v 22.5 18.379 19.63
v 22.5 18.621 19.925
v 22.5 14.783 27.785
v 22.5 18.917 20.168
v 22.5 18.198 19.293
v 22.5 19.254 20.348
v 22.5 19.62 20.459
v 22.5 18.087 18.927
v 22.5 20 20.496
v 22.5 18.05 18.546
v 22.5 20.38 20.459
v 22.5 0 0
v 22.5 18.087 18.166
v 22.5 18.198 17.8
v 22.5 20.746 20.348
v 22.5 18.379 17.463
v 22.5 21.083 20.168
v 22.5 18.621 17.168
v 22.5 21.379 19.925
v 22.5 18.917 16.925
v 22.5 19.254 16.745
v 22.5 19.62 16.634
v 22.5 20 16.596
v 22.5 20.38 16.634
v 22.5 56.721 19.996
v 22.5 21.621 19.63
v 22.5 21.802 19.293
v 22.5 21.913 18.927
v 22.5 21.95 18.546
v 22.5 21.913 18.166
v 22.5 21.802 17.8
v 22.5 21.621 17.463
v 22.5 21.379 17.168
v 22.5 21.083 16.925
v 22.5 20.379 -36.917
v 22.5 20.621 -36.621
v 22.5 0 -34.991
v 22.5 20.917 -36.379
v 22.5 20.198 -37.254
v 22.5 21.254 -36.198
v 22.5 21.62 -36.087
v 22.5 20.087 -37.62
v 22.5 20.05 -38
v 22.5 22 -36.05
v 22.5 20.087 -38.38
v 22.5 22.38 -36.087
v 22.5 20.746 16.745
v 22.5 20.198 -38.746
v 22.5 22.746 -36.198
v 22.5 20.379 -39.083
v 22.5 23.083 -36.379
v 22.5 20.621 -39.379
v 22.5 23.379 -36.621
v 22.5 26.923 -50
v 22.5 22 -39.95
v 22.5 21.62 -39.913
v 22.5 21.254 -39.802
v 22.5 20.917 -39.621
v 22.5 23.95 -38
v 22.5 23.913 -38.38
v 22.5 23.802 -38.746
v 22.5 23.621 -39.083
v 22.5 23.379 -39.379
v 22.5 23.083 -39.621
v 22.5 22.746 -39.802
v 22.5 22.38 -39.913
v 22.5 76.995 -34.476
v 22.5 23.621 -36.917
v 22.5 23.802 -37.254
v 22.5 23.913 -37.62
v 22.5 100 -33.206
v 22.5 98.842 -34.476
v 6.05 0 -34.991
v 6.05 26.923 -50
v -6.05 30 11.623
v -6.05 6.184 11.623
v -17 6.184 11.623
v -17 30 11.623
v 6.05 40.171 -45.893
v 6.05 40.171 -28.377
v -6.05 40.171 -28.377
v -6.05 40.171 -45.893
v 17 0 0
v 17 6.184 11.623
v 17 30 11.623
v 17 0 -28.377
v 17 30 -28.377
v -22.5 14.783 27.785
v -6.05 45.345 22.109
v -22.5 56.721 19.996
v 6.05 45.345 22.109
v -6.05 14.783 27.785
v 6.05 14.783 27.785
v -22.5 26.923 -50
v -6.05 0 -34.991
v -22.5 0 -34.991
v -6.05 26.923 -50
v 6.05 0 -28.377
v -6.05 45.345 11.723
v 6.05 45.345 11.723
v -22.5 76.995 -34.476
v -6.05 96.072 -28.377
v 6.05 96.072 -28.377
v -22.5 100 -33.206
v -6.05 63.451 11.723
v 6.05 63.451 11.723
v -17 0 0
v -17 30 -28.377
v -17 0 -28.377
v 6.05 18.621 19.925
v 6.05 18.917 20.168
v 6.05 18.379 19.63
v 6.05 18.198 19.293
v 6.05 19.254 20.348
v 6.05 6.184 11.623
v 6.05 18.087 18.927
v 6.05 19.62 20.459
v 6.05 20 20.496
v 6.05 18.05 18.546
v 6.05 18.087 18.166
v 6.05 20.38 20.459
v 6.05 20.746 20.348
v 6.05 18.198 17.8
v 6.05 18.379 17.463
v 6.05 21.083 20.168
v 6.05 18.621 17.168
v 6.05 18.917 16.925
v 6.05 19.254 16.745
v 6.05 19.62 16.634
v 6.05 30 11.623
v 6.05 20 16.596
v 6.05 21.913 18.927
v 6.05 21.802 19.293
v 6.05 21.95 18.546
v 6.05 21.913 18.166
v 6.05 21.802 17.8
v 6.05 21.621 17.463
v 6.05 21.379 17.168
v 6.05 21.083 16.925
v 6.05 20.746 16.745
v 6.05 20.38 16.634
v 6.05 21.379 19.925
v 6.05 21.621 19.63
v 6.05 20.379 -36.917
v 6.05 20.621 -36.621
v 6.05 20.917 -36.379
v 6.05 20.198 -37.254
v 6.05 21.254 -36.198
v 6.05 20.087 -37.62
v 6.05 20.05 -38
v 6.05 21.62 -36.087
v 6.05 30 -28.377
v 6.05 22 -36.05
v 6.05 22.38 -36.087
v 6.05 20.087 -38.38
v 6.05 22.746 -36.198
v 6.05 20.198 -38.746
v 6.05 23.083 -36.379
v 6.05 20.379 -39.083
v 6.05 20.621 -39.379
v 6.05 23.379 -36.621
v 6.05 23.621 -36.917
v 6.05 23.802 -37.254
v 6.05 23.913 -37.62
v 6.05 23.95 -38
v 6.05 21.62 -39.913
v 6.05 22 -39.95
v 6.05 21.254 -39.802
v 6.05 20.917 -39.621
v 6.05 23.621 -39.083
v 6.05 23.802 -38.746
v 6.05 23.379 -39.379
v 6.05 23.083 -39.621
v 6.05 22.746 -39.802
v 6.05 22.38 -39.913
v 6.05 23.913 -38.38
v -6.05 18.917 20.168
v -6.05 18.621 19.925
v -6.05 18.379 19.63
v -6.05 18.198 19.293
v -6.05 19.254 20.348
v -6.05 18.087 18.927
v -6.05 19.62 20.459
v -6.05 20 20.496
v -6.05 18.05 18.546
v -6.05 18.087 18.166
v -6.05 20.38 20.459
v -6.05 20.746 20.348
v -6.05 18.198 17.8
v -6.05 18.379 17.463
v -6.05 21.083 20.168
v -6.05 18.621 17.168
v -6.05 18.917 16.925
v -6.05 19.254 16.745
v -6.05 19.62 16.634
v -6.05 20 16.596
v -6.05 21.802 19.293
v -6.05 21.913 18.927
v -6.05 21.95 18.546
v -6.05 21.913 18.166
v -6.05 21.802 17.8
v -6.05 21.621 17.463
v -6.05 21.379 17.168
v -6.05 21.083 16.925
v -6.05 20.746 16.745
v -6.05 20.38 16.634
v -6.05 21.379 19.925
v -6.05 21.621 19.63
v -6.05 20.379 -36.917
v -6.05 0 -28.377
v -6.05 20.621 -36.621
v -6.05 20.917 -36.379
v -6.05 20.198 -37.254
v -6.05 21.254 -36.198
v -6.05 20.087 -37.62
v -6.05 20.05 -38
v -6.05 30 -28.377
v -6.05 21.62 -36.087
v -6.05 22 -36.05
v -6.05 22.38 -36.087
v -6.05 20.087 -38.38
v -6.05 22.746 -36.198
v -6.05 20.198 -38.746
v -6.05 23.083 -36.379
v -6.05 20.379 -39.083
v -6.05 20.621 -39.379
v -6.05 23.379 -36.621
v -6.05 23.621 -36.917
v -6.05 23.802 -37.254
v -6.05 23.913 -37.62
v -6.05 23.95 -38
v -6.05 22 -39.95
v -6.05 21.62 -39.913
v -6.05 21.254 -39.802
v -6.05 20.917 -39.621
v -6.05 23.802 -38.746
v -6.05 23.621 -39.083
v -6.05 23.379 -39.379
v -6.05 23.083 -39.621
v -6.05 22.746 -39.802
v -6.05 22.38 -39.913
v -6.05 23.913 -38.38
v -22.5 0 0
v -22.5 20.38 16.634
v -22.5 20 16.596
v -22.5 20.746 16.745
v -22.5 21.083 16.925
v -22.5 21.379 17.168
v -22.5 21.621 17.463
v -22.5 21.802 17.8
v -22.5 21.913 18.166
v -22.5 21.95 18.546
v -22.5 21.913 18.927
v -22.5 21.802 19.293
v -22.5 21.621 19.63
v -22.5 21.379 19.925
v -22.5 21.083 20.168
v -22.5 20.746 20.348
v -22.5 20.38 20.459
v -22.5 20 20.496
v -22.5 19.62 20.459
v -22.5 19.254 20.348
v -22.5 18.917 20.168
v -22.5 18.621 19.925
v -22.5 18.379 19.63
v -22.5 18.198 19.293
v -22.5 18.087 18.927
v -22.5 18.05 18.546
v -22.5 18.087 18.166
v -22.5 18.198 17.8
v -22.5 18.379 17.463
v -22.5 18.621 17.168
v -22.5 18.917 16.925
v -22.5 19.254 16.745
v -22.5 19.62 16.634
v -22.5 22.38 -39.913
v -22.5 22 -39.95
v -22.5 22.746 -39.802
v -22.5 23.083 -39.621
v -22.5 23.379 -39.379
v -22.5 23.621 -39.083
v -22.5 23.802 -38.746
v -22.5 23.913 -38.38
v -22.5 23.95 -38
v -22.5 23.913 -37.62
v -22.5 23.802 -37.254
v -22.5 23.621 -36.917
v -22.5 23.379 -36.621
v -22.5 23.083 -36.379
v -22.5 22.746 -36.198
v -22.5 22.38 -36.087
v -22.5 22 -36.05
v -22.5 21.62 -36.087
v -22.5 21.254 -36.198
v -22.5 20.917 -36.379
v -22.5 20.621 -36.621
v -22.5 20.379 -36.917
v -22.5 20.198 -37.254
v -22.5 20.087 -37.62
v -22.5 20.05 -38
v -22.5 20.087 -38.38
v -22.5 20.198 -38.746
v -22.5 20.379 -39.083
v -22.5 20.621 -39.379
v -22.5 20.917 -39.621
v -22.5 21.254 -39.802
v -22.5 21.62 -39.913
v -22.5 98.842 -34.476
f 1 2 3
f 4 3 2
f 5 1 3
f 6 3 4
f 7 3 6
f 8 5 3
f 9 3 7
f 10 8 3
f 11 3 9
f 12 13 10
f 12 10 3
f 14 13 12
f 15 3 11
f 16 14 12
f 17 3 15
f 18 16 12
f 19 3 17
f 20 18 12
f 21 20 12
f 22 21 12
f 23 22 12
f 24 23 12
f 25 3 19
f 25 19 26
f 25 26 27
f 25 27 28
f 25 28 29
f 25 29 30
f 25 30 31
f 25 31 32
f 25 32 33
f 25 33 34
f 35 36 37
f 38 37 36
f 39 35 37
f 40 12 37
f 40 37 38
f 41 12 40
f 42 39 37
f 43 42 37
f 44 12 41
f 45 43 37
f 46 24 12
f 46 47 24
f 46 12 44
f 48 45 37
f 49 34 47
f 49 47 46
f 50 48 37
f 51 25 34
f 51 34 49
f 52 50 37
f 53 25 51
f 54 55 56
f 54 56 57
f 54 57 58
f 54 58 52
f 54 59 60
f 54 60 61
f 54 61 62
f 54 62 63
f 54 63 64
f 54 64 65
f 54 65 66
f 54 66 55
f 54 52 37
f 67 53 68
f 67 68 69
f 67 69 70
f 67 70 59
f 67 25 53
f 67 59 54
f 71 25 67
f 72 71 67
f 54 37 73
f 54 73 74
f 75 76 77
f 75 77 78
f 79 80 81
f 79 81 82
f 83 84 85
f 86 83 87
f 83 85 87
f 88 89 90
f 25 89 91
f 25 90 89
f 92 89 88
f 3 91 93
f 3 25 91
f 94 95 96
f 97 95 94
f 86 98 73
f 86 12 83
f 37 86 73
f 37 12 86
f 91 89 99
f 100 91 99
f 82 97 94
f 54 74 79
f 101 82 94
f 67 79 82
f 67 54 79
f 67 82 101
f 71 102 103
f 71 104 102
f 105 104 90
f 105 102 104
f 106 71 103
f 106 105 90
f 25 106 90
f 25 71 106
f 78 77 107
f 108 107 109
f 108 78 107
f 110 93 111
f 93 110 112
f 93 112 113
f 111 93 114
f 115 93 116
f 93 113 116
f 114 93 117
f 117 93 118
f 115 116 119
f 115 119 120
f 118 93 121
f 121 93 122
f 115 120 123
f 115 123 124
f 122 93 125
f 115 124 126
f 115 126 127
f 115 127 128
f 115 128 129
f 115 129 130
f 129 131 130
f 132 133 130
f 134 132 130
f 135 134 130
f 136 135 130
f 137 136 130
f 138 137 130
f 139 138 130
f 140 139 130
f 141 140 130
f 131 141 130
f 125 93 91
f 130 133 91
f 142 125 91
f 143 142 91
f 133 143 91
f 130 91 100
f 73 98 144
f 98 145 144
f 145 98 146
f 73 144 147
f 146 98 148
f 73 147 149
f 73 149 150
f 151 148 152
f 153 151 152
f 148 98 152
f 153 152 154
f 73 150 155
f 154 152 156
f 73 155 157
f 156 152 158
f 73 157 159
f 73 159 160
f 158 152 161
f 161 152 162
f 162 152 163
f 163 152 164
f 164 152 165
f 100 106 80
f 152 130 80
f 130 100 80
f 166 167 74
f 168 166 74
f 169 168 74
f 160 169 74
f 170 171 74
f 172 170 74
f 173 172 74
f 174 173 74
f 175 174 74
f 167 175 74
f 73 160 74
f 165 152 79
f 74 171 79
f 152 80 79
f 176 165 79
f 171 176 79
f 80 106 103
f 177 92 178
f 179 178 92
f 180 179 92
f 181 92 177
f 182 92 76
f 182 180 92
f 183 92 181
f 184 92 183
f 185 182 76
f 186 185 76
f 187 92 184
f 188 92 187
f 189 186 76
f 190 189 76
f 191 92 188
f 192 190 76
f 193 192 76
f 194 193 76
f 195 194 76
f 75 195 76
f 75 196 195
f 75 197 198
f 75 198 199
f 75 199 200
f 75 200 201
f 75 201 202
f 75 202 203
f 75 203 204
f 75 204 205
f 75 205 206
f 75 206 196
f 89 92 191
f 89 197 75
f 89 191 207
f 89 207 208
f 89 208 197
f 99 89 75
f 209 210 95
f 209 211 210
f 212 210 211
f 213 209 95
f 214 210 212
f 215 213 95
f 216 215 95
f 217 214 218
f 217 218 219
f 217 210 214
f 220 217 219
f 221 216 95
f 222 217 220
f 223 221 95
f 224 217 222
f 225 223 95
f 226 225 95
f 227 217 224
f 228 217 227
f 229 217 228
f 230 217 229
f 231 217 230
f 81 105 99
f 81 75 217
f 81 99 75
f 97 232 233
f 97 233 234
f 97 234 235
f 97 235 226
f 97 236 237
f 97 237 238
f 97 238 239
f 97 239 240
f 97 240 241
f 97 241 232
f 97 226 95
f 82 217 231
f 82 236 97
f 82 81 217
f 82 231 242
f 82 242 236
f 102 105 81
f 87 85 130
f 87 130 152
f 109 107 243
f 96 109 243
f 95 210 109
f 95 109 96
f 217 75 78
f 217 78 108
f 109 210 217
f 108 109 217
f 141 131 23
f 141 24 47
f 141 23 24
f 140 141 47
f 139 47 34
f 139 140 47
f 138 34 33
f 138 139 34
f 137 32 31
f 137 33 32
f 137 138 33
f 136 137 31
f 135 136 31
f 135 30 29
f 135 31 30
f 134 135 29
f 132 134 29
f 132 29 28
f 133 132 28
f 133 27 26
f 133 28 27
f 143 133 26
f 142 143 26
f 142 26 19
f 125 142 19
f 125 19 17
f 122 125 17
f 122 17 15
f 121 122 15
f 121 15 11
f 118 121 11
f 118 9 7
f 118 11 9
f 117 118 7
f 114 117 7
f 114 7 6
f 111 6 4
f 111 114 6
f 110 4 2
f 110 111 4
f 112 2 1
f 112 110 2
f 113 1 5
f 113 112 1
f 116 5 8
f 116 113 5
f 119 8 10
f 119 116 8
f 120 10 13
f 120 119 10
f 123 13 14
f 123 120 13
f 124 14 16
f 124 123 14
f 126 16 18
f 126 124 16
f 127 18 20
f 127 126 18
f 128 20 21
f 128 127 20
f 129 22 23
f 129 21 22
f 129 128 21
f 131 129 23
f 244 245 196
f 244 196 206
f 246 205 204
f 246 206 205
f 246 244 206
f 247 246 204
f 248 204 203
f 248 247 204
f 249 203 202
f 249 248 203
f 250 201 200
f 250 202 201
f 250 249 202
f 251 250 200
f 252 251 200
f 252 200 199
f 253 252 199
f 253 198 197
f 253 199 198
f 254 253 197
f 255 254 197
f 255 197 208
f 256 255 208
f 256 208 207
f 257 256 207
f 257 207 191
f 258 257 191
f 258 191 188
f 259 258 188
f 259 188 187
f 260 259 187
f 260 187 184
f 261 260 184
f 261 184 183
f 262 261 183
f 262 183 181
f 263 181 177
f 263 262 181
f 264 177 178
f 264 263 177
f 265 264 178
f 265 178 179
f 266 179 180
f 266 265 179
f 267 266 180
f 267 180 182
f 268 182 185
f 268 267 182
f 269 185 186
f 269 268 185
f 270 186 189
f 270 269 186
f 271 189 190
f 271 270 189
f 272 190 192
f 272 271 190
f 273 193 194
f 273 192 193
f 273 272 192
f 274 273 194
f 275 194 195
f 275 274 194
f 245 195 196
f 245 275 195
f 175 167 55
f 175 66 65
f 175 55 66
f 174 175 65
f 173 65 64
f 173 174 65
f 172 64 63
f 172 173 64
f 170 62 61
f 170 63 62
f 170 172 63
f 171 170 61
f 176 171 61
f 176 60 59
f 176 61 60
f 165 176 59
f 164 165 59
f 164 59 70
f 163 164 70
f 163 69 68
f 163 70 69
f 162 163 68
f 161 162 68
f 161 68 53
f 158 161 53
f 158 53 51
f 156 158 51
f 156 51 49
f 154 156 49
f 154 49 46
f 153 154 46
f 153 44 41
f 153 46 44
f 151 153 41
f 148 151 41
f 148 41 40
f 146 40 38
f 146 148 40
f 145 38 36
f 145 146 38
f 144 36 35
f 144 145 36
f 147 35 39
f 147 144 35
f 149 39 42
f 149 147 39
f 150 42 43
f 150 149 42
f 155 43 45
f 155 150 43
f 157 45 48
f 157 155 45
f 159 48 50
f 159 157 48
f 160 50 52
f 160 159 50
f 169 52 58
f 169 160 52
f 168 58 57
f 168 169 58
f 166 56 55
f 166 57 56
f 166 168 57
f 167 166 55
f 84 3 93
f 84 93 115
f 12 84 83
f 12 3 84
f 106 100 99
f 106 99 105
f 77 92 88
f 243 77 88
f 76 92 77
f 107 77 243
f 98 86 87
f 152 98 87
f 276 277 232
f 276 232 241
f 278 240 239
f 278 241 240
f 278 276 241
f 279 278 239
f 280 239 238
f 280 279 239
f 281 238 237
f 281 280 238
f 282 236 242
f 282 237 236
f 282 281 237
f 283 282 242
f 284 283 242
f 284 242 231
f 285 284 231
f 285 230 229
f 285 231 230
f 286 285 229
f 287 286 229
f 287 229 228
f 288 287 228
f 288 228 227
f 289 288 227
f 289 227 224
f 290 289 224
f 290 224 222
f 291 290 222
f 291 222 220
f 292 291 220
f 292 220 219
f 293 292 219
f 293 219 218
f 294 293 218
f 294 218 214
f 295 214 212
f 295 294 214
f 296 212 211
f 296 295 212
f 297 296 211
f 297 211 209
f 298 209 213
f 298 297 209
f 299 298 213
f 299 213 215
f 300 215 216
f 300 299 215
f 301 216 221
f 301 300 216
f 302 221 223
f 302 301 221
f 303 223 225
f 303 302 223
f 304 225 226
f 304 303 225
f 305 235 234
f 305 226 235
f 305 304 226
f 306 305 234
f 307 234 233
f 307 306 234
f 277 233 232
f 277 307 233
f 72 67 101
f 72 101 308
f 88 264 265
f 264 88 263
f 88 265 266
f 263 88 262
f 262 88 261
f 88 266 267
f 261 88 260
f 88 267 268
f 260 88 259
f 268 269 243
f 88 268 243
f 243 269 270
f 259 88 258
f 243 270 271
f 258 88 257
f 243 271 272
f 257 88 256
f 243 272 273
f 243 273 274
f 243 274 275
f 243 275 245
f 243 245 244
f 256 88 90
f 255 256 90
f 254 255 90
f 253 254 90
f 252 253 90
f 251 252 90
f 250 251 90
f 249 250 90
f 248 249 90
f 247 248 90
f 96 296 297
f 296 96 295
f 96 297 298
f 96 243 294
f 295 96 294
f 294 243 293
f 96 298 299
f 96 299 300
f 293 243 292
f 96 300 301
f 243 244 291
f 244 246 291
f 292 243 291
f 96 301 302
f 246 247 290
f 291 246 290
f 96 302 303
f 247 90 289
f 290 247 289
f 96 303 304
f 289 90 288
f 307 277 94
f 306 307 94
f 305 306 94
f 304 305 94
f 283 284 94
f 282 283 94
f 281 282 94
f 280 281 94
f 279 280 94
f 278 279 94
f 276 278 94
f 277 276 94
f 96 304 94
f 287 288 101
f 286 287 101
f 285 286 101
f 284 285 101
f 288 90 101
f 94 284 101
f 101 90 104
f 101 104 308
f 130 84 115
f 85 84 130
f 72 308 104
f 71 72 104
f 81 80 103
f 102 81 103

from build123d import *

# Parameters (mm, degrees)
EXTRUDE_1_DEPTH          = 22.5
SKETCH_2_W               = 40.1
SKETCH_2_H               = 134.948718637
CUT_EXTRUDE_1_DEPTH      = 6.05
SKETCH_3_W               = 40
SKETCH_3_H               = 54.532079191
CUT_EXTRUDE_2_DEPTH      = 17
CUT_EXTRUDE_3_DEPTH      = 115.04494728
CUT_EXTRUDE_3_DEPTH_BACK = 115.04494728
SKETCH_4_R               = 1.95
SKETCH_5_W               = 28.894932664
SKETCH_5_H               = 60.313820621
SKETCH_5_W_2             = 36.035634414
SKETCH_5_H_2             = 53.811811248
CUT_EXTRUDE_4_DEPTH      = 6.05


with BuildPart() as part:
    # 스케치1 → 보스-돌출1 (new, symmetric)
    with BuildSketch(Plane(origin=(0, 0, 0), x_dir=(0, 0, -1), z_dir=(1, 0, 0))):
        Polygon((0, 0), (34.990619137, 0), (50, 26.923076923), (34.47567302, 76.995358537), (34.47567302, 98.842339146), (33.205617909, 100), (-19.995898679, 56.72140075), (-27.785311637, 14.783172795), align=None)
    extrude(amount=EXTRUDE_1_DEPTH, both=True)

    # 스케치2 → 컷-돌출1 (cut, symmetric)
    with BuildSketch(Plane(origin=(0, 0, 0), x_dir=(0, 0, -1), z_dir=(1, 0, 0))):
        with Locations((8.32658036, 49.272905611)):
            Rectangle(SKETCH_2_W, SKETCH_2_H)
    extrude(amount=CUT_EXTRUDE_1_DEPTH, both=True, mode=Mode.SUBTRACT)

    # 스케치3 → 컷-돌출2 (cut, symmetric)
    with BuildSketch(Plane(origin=(0, 0, 0), x_dir=(0, 0, -1), z_dir=(1, 0, 0))):
        with Locations((8.37658036, 2.733960405)):
            Rectangle(SKETCH_3_W, SKETCH_3_H)
    extrude(amount=CUT_EXTRUDE_2_DEPTH, both=True, mode=Mode.SUBTRACT)

    # 스케치4 → 컷-돌출3 (cut, two sides: drawn at the far end of the back side and taken through both)
    with BuildSketch(Plane(origin=(0, 0, 0), x_dir=(0, 0, -1), z_dir=(1, 0, 0)).offset(-CUT_EXTRUDE_3_DEPTH_BACK)):
        with Locations((-18.546360236, 20)):
            Circle(SKETCH_4_R)
        with Locations((38, 22)):
            Circle(SKETCH_4_R)
    extrude(amount=CUT_EXTRUDE_3_DEPTH + CUT_EXTRUDE_3_DEPTH_BACK, mode=Mode.SUBTRACT)

    # 스케치5 → 컷-돌출4 (cut, symmetric)
    with BuildSketch(Plane(origin=(0, 0, 0), x_dir=(0, 0, -1), z_dir=(1, 0, 0))):
        with Locations((-22.490735836, 15.187792046)):
            Rectangle(SKETCH_5_W, SKETCH_5_H)
        with Locations((41.692548501, 13.265290011)):
            Rectangle(SKETCH_5_W_2, SKETCH_5_H_2)
    extrude(amount=CUT_EXTRUDE_4_DEPTH, both=True, mode=Mode.SUBTRACT)


solid = part.part
